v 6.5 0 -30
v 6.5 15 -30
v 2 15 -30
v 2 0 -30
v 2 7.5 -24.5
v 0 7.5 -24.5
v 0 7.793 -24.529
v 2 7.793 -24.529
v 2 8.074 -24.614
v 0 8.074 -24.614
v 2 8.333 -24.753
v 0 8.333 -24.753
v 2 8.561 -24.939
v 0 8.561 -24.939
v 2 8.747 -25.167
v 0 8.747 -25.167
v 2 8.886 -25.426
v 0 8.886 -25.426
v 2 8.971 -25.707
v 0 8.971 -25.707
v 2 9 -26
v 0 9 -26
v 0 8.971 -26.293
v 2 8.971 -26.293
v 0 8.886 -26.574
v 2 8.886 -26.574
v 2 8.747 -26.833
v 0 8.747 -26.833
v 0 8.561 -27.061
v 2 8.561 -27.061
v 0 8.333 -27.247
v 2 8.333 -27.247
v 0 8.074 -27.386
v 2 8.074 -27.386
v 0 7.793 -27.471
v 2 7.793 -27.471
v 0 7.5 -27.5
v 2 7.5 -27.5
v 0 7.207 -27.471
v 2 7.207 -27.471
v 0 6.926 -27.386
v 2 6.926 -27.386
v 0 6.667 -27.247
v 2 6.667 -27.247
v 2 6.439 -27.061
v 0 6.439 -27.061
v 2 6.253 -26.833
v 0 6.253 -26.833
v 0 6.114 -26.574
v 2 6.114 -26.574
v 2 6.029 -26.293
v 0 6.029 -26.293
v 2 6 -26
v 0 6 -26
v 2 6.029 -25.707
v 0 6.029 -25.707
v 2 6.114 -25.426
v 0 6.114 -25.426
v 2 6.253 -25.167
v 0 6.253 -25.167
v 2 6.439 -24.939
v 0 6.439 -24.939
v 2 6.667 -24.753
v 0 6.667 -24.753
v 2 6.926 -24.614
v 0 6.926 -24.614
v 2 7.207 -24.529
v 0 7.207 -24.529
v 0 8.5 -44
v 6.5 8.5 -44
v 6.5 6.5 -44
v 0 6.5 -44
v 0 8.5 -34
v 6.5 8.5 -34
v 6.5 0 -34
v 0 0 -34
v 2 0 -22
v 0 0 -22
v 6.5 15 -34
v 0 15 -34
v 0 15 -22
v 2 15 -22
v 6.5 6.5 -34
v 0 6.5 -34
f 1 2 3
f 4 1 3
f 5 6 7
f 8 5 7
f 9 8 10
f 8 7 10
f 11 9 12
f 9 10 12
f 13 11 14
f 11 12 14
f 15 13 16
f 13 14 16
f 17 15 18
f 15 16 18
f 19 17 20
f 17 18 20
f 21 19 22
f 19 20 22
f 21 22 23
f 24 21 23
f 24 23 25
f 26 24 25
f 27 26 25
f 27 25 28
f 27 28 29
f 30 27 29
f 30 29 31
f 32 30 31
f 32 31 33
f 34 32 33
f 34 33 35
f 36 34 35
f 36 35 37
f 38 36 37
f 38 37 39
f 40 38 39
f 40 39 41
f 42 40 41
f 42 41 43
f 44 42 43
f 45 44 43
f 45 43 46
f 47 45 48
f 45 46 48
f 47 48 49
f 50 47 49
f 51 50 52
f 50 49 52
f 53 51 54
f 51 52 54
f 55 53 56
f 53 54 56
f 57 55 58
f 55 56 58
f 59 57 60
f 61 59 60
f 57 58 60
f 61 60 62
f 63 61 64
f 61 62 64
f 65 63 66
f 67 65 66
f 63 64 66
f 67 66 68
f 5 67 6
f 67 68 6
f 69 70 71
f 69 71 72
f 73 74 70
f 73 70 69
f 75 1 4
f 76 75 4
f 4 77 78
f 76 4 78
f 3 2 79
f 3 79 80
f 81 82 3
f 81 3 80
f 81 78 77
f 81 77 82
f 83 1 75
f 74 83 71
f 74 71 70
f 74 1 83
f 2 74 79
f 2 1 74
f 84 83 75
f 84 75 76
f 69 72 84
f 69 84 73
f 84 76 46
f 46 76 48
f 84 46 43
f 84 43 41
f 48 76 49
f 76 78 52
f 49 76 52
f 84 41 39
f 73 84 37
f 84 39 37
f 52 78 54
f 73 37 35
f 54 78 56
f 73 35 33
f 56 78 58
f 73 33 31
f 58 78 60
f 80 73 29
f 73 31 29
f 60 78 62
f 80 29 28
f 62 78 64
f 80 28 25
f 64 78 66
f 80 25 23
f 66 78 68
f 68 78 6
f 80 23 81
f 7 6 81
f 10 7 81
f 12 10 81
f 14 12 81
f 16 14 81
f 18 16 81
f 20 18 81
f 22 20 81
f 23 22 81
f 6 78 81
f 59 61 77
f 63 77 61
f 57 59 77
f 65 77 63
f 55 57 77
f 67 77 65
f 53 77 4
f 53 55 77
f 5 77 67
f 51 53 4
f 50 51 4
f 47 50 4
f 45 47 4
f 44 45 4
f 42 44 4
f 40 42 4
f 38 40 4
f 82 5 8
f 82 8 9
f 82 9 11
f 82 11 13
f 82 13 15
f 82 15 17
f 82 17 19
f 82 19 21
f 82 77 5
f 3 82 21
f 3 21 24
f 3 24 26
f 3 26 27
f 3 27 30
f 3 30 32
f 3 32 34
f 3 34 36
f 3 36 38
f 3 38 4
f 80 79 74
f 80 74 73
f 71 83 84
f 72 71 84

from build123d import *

# Parameters (mm, degrees)
SKETCH1_W           = 30
SKETCH1_H           = 15
BOSS_EXTRUDE1_DEPTH = 2
SKETCH2_W           = 6.5
SKETCH2_H           = 15
BOSS_EXTRUDE2_DEPTH = 4
SKETCH3_W           = 6.5
SKETCH3_H           = 2
BOSS_EXTRUDE3_DEPTH = 10
SKETCH4_R           = 2
CUT_EXTRUDE2_DEPTH  = 5
BOSS_EXTRUDE4_START = 5
SKETCH5_R           = 3.5
SKETCH5_R_2         = 2
BOSS_EXTRUDE4_DEPTH = 5
SKETCH6_W           = 22
SKETCH6_H           = 15
CUT_EXTRUDE3_DEPTH  = 10
SKETCH7_R           = 1.5
CUT_EXTRUDE4_DEPTH  = 10


with BuildPart() as part:
    # Sketch1 → Boss-Extrude1 (new body)
    with BuildSketch(Plane(origin=(0, 0, 0), x_dir=(0, 0, -1), z_dir=(1, 0, 0))):
        with Locations((15, 7.5)):
            Rectangle(SKETCH1_W, SKETCH1_H)
    extrude(amount=BOSS_EXTRUDE1_DEPTH)

    # Sketch2 → Boss-Extrude2 (add)
    with BuildSketch(Plane(origin=(0, 0, -30), x_dir=(-1, 0, 0), z_dir=(0, 0, -1))):
        with Locations((-3.25, 7.5)):
            Rectangle(SKETCH2_W, SKETCH2_H)
    extrude(amount=BOSS_EXTRUDE2_DEPTH)

    # Sketch3 → Boss-Extrude3 (add)
    with BuildSketch(Plane(origin=(0, 0, -34), x_dir=(-1, 0, 0), z_dir=(0, 0, -1))):
        with Locations((-3.25, 7.5)):
            Rectangle(SKETCH3_W, SKETCH3_H)
    extrude(amount=BOSS_EXTRUDE3_DEPTH)

    # Sketch4 → Cut-Extrude2 (cut)
    with BuildSketch(Plane(origin=(2, 0, 0), x_dir=(0, 0, -1), z_dir=(1, 0, 0))):
        with Locations((10, 7.5)):
            Circle(SKETCH4_R)
    extrude(amount=-CUT_EXTRUDE2_DEPTH, mode=Mode.SUBTRACT)

    # Sketch5 → Boss-Extrude4 (add)
    with BuildSketch(Plane(origin=(2, 0, 0), x_dir=(0, 0, -1), z_dir=(1, 0, 0)).offset(BOSS_EXTRUDE4_START)):
        with Locations(Location((10, 7.5, 0), (0, 0, 180))):
            Circle(SKETCH5_R)
        with Locations((10, 7.5)):
            Circle(SKETCH5_R_2, mode=Mode.SUBTRACT)
    extrude(amount=-BOSS_EXTRUDE4_DEPTH)

    # Sketch6 → Cut-Extrude3 (cut)
    with BuildSketch(Plane.ZY):
        with Locations((-11, 7.5)):
            Rectangle(SKETCH6_W, SKETCH6_H)
    extrude(amount=-CUT_EXTRUDE3_DEPTH, mode=Mode.SUBTRACT)

    # Sketch7 → Cut-Extrude4 (cut)
    with BuildSketch(Plane.ZY):
        with Locations((-26, 7.5)):
            Circle(SKETCH7_R)
    extrude(amount=-CUT_EXTRUDE4_DEPTH, mode=Mode.SUBTRACT)


solid = part.part
